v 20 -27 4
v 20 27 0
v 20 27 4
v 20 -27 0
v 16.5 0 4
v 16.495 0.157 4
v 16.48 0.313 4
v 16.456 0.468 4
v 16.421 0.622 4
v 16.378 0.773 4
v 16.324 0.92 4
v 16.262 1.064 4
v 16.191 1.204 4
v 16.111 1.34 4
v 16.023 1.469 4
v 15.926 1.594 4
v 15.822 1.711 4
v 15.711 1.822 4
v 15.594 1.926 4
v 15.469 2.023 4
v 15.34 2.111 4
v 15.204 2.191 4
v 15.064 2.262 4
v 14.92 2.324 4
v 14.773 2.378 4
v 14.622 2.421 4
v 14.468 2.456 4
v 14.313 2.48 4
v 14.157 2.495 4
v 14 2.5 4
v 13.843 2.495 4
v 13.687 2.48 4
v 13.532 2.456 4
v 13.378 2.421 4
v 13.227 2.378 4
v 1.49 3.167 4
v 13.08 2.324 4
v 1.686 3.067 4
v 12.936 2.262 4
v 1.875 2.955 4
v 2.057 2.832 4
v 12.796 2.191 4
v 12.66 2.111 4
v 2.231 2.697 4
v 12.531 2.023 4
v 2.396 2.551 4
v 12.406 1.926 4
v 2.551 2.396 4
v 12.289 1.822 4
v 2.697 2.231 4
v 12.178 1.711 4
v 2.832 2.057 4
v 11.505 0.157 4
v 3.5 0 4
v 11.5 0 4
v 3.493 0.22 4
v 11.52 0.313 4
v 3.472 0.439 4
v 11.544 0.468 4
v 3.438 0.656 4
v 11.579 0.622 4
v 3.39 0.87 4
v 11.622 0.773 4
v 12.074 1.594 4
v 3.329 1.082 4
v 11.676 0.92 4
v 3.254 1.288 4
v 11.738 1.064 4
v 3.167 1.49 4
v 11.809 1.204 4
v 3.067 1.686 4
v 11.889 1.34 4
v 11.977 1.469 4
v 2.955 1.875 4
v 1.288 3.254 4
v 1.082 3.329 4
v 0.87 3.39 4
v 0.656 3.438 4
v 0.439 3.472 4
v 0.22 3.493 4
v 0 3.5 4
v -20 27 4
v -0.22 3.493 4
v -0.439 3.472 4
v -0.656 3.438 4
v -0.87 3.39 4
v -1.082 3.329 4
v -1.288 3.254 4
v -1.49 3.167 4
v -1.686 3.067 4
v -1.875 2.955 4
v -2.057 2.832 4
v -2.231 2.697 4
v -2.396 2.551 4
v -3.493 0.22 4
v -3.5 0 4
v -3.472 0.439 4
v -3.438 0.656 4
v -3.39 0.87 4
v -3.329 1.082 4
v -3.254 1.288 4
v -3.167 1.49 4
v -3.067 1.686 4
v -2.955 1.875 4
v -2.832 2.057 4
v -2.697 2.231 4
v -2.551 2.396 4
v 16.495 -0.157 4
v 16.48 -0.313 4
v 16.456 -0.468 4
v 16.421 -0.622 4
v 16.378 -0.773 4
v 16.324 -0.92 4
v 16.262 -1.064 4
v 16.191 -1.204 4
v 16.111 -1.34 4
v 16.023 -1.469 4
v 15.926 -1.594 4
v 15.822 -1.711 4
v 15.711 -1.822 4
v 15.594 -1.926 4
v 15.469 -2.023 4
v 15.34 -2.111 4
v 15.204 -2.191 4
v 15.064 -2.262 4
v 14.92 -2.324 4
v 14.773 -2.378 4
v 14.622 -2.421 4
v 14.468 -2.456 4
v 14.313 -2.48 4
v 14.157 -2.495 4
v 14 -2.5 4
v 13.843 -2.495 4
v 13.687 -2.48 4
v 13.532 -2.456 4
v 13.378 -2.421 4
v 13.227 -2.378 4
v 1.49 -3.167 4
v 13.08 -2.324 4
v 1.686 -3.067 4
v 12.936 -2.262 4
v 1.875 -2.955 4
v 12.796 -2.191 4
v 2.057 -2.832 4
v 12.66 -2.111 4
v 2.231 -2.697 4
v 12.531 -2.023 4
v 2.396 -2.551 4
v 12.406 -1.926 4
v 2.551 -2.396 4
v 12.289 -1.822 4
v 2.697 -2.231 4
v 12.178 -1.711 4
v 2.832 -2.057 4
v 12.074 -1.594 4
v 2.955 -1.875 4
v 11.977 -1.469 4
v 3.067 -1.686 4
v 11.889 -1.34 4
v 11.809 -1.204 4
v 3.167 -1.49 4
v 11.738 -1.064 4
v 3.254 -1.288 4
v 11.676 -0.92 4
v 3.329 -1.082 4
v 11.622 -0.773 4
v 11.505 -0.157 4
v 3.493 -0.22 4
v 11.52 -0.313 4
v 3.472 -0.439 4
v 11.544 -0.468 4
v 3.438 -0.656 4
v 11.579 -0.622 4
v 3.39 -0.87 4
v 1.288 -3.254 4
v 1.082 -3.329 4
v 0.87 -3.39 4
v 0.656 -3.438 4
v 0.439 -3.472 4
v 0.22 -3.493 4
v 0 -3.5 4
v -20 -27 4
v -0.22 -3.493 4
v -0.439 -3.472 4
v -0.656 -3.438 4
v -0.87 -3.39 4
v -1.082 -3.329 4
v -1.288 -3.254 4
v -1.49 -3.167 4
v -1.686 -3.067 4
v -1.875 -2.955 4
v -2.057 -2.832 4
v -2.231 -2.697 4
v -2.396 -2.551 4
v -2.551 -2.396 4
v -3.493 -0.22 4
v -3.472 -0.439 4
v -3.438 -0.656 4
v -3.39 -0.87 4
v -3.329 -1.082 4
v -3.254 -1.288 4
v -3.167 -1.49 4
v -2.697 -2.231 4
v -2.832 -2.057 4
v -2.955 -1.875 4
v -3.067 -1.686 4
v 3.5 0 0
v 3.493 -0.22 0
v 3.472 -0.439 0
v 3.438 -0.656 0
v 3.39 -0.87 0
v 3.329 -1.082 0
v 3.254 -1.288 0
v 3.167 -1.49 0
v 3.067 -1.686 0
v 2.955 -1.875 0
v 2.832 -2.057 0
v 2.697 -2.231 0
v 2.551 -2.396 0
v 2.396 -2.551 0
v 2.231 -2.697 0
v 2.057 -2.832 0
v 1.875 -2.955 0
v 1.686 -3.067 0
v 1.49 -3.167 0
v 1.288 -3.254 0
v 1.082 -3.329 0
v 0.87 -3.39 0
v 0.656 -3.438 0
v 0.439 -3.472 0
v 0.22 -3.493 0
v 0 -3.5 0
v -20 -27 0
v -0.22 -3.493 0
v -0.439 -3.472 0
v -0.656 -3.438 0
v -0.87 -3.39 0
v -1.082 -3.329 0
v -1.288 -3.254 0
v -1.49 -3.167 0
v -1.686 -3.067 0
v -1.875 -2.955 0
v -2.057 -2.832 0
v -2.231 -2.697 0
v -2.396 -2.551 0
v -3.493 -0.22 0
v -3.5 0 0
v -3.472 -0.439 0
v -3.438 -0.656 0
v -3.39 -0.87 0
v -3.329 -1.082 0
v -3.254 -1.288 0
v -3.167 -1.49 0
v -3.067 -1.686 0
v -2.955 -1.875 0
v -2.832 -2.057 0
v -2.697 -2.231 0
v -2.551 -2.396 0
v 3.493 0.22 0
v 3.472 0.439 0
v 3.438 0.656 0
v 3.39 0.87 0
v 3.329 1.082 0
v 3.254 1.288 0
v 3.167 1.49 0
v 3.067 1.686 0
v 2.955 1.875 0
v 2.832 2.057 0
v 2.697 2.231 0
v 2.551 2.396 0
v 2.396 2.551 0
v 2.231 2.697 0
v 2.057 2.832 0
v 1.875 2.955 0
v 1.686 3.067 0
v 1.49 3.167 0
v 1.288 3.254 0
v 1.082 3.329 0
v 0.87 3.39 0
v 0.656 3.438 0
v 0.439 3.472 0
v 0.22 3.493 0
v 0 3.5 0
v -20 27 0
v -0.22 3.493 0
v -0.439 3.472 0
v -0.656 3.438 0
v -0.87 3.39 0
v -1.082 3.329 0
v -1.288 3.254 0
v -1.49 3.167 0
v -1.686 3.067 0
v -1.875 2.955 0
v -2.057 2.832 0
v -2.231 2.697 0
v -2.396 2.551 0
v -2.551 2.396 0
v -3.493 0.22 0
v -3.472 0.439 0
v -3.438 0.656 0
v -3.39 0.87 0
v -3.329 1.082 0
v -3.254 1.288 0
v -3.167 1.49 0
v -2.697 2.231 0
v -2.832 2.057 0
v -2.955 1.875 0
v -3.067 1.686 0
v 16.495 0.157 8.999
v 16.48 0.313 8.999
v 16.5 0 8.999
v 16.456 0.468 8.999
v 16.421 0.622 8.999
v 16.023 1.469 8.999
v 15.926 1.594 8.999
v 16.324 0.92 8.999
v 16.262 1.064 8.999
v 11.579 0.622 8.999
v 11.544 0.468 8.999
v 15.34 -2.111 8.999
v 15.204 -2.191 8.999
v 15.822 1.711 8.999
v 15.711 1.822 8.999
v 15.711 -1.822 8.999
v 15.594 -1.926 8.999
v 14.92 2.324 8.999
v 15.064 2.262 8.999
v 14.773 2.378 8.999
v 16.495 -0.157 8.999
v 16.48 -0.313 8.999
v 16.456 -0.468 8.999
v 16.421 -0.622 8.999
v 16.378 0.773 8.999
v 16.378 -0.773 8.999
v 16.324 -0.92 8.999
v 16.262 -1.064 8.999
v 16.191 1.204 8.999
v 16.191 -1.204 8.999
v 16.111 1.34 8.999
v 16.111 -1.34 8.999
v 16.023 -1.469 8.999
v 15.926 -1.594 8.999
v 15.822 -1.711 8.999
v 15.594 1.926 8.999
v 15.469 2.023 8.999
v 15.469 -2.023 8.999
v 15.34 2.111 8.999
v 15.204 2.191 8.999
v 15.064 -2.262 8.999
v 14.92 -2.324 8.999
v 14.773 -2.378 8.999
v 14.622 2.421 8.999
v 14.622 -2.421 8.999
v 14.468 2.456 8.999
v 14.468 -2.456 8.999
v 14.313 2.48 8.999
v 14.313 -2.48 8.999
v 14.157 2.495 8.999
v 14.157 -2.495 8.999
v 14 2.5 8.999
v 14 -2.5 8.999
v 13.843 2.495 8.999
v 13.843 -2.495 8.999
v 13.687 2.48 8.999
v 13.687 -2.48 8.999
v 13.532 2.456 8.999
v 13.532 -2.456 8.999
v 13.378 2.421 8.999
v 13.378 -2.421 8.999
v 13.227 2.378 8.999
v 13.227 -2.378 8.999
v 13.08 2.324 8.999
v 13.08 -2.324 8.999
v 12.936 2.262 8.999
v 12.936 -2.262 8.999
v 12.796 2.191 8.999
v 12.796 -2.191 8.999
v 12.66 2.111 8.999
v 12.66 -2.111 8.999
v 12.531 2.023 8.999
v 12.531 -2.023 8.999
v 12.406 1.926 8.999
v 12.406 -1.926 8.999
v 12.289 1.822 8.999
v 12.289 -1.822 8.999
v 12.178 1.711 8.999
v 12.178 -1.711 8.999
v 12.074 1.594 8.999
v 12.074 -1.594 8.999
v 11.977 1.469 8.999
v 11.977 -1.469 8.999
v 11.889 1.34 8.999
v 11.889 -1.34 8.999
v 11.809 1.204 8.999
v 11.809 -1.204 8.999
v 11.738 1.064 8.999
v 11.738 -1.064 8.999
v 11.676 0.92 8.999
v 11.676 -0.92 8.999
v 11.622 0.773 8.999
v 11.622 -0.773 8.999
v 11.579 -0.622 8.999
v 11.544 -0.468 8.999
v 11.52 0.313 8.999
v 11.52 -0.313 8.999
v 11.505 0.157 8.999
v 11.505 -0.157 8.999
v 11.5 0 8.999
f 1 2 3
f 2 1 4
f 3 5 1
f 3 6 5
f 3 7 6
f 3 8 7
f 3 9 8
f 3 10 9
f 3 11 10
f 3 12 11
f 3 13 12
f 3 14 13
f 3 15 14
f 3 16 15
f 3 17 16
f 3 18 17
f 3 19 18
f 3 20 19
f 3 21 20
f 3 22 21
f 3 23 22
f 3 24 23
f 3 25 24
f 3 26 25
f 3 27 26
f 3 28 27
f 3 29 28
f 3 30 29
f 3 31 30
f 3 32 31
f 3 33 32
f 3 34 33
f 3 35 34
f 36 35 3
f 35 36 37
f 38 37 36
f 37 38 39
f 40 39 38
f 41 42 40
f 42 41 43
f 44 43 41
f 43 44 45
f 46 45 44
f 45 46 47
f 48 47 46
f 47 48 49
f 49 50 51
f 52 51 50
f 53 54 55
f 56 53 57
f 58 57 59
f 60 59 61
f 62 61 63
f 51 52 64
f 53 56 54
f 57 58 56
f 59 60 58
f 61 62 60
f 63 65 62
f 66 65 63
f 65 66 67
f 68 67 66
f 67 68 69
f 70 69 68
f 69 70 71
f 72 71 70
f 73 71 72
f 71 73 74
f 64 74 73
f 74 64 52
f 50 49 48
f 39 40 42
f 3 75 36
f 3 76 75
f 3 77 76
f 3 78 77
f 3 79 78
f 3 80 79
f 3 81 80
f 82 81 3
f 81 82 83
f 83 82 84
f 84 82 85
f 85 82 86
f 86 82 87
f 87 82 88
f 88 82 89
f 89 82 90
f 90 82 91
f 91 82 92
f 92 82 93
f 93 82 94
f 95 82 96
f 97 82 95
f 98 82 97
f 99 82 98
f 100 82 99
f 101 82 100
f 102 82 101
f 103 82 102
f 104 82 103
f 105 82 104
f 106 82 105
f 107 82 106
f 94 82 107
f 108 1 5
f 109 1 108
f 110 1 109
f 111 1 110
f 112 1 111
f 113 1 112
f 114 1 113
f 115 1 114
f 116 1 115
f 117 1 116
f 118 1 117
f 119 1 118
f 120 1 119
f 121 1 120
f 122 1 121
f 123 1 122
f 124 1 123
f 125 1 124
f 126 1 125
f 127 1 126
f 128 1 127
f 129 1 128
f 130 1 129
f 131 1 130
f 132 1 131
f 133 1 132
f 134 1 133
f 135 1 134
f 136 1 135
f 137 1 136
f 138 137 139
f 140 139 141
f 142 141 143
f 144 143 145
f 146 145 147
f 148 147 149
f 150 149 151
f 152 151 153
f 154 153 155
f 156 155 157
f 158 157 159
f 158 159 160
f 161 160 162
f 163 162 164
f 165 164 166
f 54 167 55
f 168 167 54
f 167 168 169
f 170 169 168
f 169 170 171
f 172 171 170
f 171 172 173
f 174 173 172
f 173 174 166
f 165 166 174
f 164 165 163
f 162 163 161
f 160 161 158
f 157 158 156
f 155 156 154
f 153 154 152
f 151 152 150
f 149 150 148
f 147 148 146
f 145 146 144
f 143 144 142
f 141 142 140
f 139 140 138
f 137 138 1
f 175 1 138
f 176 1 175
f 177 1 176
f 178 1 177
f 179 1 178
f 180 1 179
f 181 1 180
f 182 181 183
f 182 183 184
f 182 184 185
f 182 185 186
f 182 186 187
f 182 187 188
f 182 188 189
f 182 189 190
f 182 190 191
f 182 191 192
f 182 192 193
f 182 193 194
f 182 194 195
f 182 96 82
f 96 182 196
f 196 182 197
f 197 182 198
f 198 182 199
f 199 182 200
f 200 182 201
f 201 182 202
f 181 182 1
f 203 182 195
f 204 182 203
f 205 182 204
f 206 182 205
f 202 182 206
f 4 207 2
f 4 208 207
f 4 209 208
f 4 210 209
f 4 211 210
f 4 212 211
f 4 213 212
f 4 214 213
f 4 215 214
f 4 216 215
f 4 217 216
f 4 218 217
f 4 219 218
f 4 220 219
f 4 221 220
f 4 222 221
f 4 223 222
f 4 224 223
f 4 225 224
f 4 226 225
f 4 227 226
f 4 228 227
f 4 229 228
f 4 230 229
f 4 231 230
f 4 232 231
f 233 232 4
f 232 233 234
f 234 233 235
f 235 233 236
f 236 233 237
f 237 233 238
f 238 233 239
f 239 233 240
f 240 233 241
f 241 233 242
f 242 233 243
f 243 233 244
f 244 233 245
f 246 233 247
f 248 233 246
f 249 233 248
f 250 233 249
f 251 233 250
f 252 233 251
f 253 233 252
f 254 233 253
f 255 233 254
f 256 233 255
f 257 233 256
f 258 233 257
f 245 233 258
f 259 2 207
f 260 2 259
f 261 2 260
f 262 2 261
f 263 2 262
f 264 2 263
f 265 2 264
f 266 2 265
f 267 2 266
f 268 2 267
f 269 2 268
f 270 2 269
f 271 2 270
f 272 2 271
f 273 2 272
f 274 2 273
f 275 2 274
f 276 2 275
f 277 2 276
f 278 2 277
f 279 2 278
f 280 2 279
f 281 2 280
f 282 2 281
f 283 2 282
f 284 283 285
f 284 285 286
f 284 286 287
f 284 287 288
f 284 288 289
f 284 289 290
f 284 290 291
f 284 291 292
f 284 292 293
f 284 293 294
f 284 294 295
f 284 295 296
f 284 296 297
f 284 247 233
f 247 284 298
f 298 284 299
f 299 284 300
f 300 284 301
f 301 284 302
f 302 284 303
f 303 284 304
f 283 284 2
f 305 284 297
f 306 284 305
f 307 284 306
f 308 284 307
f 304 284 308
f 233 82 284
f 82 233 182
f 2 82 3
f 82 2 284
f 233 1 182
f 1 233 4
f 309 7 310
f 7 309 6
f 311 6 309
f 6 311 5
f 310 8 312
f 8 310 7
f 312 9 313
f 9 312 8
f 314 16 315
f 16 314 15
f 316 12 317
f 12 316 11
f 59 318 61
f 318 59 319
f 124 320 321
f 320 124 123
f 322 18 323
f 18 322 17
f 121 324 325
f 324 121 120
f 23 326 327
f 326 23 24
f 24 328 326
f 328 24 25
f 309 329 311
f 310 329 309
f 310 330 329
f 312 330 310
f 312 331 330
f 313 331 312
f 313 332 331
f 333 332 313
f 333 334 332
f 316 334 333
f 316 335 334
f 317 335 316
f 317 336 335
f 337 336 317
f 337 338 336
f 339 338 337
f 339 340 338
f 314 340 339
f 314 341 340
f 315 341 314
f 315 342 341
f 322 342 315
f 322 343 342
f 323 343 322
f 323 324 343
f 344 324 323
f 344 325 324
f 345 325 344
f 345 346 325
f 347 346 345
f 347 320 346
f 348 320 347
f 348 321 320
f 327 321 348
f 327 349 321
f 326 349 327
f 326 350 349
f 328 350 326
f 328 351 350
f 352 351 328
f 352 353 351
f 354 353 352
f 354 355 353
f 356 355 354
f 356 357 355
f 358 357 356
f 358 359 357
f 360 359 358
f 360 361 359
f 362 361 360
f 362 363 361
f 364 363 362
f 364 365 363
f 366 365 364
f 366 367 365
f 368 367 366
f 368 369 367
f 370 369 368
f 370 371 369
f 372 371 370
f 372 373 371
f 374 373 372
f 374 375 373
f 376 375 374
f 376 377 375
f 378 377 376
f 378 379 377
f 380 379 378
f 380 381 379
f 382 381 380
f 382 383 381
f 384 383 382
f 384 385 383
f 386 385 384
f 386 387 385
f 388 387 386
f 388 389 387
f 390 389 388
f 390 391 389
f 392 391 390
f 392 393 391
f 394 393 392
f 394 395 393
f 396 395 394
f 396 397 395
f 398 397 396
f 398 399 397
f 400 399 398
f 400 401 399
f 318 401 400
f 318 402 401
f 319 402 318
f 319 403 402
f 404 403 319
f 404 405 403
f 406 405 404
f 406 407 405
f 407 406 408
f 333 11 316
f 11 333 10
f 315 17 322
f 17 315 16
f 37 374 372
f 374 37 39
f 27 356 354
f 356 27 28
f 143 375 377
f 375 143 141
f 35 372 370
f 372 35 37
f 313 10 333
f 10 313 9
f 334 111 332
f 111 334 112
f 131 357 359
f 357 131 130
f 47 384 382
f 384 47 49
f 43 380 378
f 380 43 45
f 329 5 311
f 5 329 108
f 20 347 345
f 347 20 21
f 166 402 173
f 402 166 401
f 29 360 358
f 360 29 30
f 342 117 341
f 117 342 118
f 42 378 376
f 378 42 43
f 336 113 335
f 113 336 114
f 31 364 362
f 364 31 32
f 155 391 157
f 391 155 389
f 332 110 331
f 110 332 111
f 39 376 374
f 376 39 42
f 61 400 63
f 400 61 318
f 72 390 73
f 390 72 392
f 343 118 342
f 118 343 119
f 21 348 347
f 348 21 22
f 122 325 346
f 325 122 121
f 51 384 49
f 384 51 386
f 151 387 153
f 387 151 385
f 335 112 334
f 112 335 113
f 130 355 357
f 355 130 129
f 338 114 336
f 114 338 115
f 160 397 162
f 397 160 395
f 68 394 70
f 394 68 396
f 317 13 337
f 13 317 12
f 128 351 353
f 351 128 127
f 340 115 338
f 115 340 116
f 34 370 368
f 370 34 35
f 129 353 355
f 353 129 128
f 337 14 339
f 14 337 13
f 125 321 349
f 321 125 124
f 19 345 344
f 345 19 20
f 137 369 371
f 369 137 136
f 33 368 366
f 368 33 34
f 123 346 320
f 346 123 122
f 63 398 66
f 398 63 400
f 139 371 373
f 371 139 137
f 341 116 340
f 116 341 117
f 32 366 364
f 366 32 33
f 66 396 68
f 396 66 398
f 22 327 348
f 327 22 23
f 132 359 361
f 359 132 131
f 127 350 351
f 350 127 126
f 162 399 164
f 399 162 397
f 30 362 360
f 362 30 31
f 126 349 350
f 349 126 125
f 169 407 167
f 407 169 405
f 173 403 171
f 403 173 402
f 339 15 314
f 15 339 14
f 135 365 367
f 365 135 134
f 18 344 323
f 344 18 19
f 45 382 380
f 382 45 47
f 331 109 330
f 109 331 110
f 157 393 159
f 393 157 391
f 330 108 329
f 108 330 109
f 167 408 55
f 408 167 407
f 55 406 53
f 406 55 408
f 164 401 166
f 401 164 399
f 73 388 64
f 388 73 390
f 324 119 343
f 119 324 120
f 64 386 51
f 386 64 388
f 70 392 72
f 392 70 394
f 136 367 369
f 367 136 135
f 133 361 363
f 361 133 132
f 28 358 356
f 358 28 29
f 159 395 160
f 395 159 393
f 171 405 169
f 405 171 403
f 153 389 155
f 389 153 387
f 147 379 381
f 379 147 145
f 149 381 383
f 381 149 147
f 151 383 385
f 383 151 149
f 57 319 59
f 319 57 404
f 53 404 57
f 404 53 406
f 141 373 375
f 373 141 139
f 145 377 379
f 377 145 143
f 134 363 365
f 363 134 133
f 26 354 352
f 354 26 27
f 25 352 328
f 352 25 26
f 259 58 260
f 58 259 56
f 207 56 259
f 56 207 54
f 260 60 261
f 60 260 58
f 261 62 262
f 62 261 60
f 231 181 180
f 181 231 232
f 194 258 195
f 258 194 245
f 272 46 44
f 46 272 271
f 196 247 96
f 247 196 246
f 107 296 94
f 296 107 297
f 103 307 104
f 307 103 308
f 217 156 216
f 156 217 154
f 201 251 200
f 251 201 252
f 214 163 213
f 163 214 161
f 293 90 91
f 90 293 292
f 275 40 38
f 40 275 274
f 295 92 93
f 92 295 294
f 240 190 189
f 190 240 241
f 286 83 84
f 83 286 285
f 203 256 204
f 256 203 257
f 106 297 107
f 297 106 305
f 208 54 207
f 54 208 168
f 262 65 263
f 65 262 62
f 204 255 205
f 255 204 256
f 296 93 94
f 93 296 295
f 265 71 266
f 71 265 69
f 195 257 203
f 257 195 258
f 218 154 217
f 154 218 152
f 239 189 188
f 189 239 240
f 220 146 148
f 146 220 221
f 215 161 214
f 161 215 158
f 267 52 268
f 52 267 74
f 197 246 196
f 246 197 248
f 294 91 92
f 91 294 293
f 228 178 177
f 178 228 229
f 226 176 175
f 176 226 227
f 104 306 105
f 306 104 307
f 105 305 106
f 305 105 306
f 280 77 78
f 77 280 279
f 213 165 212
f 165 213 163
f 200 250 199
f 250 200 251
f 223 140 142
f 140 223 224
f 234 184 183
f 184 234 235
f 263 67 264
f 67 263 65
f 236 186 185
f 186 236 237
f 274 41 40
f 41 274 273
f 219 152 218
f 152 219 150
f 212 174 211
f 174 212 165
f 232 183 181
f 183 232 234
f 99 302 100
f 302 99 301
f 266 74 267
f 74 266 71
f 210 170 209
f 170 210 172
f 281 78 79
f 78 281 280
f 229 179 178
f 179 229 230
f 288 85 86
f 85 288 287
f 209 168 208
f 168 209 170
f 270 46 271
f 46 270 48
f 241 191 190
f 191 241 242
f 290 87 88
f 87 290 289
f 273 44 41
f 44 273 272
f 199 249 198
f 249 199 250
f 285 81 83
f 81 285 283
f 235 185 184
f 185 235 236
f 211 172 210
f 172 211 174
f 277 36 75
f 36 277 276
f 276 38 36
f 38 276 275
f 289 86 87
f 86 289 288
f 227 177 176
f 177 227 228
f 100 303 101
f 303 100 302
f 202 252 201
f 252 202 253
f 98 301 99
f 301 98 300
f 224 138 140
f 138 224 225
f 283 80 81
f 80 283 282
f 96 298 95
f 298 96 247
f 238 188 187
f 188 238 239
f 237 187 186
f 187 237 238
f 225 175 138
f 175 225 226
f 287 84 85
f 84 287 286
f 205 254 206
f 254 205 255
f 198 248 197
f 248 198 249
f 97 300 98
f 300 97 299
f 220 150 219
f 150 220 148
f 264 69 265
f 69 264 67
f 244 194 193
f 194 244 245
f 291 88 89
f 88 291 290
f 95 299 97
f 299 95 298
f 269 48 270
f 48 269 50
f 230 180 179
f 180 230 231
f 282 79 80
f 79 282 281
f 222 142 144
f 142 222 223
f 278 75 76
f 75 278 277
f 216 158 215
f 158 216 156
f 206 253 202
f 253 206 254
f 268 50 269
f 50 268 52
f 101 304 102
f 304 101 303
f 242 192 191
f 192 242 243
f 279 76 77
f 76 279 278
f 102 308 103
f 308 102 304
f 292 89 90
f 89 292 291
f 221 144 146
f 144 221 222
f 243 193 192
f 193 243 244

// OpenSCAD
$fa = 1;
$fs = 0.2;
$fn = 100;
module tracker_mount_base(nut_side = 10, screw_radius = 4, nut_depth = 3, thickness = 4) {
    translate([0,0,thickness/2])
    cube([40,54,thickness], center = true);
    translate([0,0,thickness-0.001])
    translate([14,0,0])
    cylinder(5,2.5,2.5);
    
}

module hexagon(side, height, center) {
  length = sqrt(3) * side;
  translate_value = center ? [0, 0, 0] :
                             [side, length / 2, height / 2];
  translate(translate_value)
    for (r = [-60, 0, 60])
      rotate([0, 0, r])
        cube([side, length, height], center=true);
}

module screw_hole(screw_radius=0.3,nut_side=0.8,nut_depth = 0.4, screw_depth = 3){
    cylinder(h = screw_depth, r = screw_radius);
    translate([0,0,nut_depth/2])
    hexagon(side=nut_side,height=nut_depth,center=true);
    
}

module mount_module(screw_radius=3.5,nut_side=0.8,nut_depth = 0, screw_depth = 10, thickness= 7) {
    difference(){
        tracker_mount_base();
        translate([0,0,-0.001])
        screw_hole(screw_radius=screw_radius,nut_side=nut_side,nut_depth = nut_depth, screw_depth = screw_depth);
    }
}
mount_module();
